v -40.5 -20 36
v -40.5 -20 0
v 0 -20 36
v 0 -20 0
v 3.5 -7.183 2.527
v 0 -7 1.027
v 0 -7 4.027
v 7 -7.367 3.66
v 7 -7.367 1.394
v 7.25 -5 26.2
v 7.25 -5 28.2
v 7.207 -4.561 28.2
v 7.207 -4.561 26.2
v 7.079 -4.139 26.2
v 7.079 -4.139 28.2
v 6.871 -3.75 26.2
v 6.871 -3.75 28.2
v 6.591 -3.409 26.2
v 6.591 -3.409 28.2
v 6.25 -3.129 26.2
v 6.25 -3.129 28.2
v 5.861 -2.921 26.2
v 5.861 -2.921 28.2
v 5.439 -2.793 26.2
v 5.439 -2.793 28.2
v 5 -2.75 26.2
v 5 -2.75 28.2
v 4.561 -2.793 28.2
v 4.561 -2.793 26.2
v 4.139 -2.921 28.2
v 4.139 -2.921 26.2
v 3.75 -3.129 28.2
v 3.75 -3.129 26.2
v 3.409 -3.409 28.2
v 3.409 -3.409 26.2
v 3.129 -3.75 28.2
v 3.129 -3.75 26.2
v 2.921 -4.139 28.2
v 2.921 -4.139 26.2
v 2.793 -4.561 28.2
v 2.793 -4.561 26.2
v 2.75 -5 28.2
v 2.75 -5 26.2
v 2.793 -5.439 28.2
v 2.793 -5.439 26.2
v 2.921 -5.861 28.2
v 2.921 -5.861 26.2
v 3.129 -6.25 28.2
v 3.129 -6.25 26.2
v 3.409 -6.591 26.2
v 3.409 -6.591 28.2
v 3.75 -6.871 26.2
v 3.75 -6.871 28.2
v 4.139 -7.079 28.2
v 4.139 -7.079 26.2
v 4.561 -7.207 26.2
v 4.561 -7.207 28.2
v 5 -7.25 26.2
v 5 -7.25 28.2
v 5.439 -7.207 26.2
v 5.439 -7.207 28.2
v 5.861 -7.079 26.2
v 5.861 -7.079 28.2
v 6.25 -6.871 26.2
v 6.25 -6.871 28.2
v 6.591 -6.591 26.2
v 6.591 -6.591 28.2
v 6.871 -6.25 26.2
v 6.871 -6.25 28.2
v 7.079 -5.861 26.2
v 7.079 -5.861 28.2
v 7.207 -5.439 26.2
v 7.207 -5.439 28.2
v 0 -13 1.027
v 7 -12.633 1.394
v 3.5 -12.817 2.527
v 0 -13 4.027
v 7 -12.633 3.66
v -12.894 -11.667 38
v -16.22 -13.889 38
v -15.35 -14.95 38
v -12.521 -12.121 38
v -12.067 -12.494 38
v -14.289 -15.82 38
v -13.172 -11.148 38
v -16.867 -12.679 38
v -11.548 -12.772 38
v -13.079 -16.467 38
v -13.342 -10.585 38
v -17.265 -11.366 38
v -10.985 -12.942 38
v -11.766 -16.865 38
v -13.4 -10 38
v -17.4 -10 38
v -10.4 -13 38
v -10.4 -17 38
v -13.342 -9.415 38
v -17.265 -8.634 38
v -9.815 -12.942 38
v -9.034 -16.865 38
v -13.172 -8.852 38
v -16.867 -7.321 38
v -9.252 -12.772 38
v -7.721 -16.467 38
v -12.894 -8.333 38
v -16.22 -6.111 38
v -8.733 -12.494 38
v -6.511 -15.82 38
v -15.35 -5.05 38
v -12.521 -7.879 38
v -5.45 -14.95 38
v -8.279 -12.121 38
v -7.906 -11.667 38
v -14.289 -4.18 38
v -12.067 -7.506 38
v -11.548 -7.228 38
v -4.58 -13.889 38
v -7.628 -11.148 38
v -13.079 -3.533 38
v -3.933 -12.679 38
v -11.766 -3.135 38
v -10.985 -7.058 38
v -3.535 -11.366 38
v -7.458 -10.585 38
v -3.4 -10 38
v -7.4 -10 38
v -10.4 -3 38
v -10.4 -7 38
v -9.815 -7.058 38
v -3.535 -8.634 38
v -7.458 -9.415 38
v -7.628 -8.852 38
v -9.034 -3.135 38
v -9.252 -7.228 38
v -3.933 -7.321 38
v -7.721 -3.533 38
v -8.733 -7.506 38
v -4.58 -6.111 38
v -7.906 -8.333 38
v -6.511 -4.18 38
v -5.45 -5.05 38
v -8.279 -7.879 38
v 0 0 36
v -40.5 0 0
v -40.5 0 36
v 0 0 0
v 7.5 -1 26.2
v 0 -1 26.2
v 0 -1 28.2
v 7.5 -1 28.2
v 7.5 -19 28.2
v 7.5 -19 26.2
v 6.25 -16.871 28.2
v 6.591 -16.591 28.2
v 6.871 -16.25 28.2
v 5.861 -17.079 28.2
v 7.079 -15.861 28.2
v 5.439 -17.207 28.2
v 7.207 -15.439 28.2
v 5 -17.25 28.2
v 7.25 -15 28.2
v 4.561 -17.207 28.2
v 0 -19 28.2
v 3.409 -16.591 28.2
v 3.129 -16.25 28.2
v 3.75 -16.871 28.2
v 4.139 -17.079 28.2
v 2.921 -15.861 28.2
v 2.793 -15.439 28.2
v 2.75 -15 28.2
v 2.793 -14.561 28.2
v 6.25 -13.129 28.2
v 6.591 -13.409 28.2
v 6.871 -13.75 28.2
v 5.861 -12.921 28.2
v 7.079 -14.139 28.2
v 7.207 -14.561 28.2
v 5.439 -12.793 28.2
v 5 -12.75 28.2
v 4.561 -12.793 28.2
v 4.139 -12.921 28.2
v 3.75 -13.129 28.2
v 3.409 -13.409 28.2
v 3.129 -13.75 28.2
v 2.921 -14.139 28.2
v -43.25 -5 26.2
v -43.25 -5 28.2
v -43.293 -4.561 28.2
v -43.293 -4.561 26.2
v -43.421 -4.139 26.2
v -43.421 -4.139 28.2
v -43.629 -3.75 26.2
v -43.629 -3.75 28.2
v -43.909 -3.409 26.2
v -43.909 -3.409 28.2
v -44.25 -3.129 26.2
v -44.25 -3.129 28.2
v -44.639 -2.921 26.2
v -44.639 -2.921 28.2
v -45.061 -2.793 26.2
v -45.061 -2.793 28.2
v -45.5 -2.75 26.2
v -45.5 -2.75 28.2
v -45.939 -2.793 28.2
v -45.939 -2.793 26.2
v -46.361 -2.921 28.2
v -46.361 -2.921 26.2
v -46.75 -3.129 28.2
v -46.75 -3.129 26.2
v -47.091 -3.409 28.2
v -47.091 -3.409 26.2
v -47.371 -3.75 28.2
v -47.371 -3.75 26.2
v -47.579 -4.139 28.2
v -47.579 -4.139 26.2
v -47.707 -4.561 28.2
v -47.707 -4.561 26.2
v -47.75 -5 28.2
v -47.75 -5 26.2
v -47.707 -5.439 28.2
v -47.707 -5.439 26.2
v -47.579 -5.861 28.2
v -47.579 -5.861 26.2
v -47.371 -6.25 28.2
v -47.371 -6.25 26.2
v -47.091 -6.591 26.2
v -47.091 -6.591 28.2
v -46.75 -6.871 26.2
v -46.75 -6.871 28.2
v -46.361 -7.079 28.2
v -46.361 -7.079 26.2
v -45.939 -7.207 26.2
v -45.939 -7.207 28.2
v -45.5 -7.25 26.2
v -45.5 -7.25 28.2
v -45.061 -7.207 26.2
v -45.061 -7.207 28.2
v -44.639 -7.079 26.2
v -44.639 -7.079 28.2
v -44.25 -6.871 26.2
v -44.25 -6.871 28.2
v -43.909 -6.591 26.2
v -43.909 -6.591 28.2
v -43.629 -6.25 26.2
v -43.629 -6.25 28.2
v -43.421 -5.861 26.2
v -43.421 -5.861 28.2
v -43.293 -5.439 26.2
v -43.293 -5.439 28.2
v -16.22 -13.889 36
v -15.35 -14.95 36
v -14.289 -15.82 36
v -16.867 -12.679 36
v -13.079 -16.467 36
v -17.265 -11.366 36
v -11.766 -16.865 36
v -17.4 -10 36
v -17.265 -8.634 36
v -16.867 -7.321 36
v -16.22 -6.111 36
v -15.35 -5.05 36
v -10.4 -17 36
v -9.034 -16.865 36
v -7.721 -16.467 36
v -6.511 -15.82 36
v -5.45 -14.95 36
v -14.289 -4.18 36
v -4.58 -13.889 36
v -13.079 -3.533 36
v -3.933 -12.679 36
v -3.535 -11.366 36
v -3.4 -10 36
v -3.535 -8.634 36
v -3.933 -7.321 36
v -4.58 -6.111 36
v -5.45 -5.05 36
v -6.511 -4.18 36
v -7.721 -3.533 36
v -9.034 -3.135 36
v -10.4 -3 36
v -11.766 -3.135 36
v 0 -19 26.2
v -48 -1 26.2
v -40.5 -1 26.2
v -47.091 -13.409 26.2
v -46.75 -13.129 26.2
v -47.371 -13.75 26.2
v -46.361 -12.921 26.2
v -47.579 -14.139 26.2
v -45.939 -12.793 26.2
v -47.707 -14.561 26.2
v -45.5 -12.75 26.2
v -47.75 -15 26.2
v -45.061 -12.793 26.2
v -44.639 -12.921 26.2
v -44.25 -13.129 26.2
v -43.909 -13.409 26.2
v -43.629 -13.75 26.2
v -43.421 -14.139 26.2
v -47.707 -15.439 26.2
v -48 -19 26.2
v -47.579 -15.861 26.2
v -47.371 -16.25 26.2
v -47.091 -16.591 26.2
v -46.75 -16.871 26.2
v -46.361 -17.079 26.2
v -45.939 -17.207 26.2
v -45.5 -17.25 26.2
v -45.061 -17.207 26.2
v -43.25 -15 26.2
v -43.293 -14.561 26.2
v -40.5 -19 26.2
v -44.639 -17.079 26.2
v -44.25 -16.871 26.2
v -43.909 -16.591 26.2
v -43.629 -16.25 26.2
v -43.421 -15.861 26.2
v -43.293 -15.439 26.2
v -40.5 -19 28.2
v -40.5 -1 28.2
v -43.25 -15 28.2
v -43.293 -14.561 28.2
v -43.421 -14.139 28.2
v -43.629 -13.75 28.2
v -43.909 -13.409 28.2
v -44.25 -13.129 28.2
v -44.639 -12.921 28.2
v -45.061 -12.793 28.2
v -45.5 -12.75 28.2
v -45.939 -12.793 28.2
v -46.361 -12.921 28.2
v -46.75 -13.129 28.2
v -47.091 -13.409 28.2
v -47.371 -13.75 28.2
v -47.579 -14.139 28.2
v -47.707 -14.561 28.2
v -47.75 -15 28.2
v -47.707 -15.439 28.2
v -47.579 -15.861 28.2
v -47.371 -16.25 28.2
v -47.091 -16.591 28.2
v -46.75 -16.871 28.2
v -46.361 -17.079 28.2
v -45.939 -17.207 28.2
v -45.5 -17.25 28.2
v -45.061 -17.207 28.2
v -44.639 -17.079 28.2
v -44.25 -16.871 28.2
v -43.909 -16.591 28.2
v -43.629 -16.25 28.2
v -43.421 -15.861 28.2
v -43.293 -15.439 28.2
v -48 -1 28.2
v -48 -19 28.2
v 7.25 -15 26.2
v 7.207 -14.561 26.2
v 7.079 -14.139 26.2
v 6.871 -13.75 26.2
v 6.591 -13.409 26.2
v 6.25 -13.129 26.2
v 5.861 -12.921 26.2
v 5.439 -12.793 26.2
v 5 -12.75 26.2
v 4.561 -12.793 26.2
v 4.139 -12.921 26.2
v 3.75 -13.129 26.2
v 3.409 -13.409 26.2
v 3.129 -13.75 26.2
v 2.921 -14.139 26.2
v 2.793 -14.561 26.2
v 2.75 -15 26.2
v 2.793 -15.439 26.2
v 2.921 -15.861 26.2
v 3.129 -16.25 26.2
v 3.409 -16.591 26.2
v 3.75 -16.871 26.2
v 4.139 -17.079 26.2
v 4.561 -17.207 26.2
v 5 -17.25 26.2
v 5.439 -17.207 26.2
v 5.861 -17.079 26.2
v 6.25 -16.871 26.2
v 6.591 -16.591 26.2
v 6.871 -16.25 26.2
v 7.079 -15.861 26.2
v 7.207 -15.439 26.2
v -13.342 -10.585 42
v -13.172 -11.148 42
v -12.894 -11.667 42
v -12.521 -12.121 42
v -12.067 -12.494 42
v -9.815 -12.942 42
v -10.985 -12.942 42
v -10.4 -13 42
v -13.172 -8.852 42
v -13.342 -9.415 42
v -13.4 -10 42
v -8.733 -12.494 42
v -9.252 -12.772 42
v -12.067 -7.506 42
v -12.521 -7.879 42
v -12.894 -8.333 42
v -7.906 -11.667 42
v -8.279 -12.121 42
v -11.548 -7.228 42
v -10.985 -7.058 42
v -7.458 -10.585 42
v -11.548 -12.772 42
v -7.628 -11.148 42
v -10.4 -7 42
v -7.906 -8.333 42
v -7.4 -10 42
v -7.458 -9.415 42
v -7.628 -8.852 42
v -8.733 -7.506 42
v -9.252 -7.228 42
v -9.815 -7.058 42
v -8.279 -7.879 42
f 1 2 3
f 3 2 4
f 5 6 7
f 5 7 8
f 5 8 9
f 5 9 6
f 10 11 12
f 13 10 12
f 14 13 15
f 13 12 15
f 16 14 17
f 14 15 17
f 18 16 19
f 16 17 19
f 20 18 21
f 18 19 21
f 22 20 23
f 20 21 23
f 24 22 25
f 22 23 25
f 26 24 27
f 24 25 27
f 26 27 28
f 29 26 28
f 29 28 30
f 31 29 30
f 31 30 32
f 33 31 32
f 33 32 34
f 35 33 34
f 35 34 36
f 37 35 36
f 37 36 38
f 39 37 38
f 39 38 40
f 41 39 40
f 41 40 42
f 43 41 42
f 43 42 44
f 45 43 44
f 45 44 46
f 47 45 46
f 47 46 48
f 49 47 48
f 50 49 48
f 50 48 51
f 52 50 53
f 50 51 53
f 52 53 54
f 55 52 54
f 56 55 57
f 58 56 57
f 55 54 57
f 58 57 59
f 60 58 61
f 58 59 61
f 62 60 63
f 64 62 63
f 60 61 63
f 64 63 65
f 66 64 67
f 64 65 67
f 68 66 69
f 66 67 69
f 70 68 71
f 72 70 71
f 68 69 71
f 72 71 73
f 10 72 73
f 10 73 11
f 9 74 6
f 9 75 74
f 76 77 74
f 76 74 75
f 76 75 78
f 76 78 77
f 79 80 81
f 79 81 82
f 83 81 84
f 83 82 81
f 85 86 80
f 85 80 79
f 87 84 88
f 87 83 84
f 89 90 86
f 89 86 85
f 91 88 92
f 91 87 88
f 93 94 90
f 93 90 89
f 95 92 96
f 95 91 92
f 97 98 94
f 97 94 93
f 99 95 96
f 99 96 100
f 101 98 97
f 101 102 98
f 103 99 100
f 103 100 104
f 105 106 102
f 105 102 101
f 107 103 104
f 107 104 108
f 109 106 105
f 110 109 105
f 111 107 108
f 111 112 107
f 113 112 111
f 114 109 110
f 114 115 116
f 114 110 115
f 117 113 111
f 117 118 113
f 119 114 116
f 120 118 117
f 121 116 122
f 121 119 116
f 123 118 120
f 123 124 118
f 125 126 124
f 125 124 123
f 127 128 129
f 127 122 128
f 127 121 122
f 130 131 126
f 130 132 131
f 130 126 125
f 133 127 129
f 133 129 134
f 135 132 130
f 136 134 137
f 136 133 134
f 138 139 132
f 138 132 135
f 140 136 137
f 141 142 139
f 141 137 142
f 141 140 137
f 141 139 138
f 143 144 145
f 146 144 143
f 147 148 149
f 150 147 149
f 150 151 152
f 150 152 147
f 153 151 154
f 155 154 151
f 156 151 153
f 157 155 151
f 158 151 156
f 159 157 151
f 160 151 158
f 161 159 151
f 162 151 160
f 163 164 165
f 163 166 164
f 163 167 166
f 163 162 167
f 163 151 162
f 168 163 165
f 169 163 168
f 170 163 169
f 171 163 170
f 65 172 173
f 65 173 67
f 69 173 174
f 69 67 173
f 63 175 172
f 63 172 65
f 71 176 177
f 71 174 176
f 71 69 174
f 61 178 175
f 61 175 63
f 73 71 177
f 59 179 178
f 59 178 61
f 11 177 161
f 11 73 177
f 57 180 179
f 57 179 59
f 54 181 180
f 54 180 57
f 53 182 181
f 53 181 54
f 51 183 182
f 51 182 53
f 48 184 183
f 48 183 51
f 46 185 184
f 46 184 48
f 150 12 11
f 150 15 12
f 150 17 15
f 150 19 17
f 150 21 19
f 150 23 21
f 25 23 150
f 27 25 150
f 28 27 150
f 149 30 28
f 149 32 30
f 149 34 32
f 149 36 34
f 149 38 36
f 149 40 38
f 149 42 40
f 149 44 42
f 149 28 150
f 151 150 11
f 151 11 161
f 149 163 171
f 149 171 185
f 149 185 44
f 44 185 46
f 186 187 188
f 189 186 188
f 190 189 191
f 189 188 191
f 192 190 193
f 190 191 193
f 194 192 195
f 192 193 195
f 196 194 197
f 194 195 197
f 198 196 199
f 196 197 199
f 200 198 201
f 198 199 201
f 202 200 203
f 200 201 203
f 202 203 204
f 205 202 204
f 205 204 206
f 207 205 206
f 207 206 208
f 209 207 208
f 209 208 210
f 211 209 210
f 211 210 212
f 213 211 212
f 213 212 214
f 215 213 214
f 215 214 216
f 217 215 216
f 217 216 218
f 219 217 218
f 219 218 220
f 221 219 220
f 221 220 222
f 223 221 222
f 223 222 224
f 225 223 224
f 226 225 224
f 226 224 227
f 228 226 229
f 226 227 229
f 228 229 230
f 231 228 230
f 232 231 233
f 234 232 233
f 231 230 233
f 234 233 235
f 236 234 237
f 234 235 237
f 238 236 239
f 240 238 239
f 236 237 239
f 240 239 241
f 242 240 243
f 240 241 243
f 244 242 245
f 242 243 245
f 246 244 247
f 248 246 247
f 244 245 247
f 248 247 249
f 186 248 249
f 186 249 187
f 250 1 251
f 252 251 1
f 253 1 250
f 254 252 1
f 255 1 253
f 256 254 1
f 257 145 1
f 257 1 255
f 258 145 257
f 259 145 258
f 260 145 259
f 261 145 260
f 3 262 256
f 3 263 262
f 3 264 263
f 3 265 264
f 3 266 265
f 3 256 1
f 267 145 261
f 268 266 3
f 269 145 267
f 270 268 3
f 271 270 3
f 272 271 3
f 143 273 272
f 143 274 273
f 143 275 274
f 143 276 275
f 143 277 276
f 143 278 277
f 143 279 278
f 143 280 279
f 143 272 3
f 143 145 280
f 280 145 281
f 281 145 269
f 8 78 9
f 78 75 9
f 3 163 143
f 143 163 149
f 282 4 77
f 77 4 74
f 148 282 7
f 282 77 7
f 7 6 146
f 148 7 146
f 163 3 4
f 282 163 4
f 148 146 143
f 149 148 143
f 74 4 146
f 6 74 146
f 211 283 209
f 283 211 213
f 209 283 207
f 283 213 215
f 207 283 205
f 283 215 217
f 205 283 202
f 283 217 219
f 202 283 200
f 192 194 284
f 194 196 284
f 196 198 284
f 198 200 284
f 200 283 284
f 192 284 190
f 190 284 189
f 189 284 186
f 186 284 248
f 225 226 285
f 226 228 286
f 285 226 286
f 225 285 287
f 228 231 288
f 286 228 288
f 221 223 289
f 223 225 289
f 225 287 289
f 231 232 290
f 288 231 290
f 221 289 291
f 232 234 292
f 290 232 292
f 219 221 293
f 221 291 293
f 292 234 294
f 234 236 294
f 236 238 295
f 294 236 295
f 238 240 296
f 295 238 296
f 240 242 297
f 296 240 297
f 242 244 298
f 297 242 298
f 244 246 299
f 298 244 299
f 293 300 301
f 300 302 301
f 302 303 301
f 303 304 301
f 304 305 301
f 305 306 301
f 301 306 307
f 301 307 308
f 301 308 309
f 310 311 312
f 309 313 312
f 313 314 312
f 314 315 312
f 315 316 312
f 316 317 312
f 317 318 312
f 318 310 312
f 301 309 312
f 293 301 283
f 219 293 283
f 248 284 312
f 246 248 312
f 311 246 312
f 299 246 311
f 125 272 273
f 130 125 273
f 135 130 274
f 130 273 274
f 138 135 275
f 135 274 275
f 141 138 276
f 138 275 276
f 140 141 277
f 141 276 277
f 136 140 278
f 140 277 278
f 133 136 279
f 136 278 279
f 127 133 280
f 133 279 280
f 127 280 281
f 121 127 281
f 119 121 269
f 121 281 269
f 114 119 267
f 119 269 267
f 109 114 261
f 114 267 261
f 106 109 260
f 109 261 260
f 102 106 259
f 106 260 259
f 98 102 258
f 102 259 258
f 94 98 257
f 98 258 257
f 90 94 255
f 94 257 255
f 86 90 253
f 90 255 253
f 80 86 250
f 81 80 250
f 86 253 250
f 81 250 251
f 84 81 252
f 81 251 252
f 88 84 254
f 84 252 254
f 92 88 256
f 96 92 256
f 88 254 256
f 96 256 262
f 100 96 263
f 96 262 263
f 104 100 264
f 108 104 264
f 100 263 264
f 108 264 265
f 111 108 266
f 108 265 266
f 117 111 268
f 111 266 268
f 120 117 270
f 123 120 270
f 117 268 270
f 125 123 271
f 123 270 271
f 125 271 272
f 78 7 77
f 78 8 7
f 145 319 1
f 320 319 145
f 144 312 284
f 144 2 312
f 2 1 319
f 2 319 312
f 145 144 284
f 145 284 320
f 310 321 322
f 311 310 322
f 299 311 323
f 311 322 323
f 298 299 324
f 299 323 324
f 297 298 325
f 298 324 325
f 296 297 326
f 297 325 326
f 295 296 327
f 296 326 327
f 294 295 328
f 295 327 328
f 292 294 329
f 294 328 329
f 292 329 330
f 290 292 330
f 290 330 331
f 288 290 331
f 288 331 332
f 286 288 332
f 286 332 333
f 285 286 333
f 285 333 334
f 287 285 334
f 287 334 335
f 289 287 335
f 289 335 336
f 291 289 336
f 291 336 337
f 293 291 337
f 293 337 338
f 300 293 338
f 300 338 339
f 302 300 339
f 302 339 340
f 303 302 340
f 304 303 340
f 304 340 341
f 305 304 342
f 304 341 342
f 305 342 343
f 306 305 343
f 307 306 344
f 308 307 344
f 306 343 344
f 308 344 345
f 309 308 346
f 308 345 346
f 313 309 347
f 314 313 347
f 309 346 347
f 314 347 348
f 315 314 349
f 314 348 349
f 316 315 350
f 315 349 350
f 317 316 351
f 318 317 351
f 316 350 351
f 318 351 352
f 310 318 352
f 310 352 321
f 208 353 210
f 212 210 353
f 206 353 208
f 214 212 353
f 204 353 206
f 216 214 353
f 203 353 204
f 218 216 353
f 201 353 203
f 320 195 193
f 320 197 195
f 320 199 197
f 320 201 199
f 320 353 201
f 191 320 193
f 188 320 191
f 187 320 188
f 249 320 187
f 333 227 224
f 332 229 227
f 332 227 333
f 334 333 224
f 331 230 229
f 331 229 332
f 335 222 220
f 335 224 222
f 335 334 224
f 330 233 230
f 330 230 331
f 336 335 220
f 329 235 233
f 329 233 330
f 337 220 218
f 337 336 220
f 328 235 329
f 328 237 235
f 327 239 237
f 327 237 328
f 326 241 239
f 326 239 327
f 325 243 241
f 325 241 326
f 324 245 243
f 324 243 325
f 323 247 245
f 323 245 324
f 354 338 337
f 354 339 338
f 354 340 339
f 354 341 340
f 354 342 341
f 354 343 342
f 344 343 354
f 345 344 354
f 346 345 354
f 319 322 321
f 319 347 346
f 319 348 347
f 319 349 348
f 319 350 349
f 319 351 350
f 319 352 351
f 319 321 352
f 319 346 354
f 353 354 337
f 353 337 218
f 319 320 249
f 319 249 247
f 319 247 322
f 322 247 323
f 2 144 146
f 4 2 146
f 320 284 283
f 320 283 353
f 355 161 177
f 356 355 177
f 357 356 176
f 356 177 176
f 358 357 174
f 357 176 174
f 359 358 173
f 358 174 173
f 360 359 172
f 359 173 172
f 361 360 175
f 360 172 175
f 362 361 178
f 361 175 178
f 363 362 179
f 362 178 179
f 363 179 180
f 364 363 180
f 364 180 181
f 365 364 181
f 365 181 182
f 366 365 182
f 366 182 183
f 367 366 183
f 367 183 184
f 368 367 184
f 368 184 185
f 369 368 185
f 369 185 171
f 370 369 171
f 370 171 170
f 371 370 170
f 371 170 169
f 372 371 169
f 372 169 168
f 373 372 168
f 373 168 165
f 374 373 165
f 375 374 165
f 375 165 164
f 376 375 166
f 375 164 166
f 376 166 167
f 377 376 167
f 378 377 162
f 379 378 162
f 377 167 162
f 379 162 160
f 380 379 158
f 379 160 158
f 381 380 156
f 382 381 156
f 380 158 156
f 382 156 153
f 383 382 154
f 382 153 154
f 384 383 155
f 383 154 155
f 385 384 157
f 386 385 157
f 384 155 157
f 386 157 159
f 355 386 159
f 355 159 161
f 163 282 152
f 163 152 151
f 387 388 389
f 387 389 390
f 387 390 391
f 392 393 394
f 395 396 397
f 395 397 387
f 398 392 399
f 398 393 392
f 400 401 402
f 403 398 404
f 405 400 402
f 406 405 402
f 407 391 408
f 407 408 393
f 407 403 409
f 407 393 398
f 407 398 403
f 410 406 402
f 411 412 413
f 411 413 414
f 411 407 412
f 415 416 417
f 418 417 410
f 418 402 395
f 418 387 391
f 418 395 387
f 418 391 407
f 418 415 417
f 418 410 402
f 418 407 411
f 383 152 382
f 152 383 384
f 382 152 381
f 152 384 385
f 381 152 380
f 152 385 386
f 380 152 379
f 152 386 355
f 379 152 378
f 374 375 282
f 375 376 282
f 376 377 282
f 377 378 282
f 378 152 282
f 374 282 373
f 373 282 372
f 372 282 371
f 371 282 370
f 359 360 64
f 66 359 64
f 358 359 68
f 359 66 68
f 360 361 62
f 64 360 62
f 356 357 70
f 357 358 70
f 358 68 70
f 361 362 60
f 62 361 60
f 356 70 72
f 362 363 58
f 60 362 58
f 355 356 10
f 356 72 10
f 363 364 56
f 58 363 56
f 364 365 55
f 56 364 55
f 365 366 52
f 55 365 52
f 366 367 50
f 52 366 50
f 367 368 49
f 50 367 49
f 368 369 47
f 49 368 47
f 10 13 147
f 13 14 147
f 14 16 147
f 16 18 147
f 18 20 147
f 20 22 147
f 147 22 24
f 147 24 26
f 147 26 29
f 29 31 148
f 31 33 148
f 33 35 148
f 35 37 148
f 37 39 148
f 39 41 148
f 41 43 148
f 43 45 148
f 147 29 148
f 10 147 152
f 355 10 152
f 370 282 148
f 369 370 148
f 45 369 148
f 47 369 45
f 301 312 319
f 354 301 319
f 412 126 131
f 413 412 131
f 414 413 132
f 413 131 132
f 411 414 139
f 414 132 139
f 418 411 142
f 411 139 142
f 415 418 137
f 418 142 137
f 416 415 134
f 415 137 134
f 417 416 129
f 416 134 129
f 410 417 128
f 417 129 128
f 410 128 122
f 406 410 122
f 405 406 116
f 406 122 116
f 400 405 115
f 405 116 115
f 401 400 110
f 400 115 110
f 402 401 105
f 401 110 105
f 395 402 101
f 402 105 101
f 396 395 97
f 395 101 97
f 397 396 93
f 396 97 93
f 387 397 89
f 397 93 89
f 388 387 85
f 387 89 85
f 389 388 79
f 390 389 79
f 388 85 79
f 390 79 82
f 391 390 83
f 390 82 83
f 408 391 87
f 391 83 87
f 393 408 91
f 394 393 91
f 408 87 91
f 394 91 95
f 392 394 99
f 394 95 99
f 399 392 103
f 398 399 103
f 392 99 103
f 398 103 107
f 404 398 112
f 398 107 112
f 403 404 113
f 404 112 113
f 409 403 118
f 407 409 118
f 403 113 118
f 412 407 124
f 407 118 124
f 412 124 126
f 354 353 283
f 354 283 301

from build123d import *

# Parameters (mm, degrees)
F0_W      = 40.5
F0_H      = 20
F1_DEPTH  = 36
F2_R      = 7
F3_DEPTH  = 2
F4_R      = 3
F5_DEPTH  = 4
F6_W      = 18
F6_H      = 2
F7_DEPTH  = 7.5
F8_W      = 18
F8_H      = 2
F9_DEPTH  = 7.5
F10_R     = 2.25
F11_DEPTH = 25
F12_W     = 6
F12_H     = 3
F13_DEPTH = 7
F13_TAPER = 3


with BuildPart() as f1:
    # F0 (on Top) → F1 (new body)
    with BuildSketch(Plane.XY):
        with Locations((-20.25, -10)):
            Rectangle(F0_W, F0_H)
    extrude(amount=F1_DEPTH)

    # F2 (on face) → F3 (join)
    with BuildSketch(Plane.XY.offset(36)):
        with Locations((-10.4, -10)):
            Circle(F2_R)
    extrude(amount=F3_DEPTH)

    # F4 (on face) → F5 (join)
    with BuildSketch(Plane.XY.offset(38)):
        with Locations((-10.4, -10)):
            Circle(F4_R)
    extrude(amount=F5_DEPTH)

    # F6 (on face) → F7 (join)
    with BuildSketch(Plane.YZ):
        with Locations((-10, 27.2)):
            Rectangle(F6_W, F6_H)
    extrude(amount=F7_DEPTH)

    # F8 (on face) → F9 (join)
    with BuildSketch(Plane(origin=(-40.5, 0, 0), x_dir=(0, -1, 0), z_dir=(-1, 0, 0))):
        with Locations((10, 27.2)):
            Rectangle(F8_W, F8_H)
    extrude(amount=F9_DEPTH)

    # F10 (on face) → F11 (cut)
    with BuildSketch(Plane.XY.offset(28.2)):
        with Locations((5, -15)):
            Circle(F10_R)
        with Locations((5, -5)):
            Circle(F10_R)
        with Locations((-45.5, -5)):
            Circle(F10_R)
        with Locations((-45.5, -15)):
            Circle(F10_R)
    extrude(amount=-F11_DEPTH, mode=Mode.SUBTRACT)

    # F12 (on face) → F13 (join)
    with BuildSketch(Plane.YZ):
        with Locations((-10, 2.5268535551)):
            Rectangle(F12_W, F12_H)
    extrude(amount=F13_DEPTH, taper=F13_TAPER)


solid = f1.part
